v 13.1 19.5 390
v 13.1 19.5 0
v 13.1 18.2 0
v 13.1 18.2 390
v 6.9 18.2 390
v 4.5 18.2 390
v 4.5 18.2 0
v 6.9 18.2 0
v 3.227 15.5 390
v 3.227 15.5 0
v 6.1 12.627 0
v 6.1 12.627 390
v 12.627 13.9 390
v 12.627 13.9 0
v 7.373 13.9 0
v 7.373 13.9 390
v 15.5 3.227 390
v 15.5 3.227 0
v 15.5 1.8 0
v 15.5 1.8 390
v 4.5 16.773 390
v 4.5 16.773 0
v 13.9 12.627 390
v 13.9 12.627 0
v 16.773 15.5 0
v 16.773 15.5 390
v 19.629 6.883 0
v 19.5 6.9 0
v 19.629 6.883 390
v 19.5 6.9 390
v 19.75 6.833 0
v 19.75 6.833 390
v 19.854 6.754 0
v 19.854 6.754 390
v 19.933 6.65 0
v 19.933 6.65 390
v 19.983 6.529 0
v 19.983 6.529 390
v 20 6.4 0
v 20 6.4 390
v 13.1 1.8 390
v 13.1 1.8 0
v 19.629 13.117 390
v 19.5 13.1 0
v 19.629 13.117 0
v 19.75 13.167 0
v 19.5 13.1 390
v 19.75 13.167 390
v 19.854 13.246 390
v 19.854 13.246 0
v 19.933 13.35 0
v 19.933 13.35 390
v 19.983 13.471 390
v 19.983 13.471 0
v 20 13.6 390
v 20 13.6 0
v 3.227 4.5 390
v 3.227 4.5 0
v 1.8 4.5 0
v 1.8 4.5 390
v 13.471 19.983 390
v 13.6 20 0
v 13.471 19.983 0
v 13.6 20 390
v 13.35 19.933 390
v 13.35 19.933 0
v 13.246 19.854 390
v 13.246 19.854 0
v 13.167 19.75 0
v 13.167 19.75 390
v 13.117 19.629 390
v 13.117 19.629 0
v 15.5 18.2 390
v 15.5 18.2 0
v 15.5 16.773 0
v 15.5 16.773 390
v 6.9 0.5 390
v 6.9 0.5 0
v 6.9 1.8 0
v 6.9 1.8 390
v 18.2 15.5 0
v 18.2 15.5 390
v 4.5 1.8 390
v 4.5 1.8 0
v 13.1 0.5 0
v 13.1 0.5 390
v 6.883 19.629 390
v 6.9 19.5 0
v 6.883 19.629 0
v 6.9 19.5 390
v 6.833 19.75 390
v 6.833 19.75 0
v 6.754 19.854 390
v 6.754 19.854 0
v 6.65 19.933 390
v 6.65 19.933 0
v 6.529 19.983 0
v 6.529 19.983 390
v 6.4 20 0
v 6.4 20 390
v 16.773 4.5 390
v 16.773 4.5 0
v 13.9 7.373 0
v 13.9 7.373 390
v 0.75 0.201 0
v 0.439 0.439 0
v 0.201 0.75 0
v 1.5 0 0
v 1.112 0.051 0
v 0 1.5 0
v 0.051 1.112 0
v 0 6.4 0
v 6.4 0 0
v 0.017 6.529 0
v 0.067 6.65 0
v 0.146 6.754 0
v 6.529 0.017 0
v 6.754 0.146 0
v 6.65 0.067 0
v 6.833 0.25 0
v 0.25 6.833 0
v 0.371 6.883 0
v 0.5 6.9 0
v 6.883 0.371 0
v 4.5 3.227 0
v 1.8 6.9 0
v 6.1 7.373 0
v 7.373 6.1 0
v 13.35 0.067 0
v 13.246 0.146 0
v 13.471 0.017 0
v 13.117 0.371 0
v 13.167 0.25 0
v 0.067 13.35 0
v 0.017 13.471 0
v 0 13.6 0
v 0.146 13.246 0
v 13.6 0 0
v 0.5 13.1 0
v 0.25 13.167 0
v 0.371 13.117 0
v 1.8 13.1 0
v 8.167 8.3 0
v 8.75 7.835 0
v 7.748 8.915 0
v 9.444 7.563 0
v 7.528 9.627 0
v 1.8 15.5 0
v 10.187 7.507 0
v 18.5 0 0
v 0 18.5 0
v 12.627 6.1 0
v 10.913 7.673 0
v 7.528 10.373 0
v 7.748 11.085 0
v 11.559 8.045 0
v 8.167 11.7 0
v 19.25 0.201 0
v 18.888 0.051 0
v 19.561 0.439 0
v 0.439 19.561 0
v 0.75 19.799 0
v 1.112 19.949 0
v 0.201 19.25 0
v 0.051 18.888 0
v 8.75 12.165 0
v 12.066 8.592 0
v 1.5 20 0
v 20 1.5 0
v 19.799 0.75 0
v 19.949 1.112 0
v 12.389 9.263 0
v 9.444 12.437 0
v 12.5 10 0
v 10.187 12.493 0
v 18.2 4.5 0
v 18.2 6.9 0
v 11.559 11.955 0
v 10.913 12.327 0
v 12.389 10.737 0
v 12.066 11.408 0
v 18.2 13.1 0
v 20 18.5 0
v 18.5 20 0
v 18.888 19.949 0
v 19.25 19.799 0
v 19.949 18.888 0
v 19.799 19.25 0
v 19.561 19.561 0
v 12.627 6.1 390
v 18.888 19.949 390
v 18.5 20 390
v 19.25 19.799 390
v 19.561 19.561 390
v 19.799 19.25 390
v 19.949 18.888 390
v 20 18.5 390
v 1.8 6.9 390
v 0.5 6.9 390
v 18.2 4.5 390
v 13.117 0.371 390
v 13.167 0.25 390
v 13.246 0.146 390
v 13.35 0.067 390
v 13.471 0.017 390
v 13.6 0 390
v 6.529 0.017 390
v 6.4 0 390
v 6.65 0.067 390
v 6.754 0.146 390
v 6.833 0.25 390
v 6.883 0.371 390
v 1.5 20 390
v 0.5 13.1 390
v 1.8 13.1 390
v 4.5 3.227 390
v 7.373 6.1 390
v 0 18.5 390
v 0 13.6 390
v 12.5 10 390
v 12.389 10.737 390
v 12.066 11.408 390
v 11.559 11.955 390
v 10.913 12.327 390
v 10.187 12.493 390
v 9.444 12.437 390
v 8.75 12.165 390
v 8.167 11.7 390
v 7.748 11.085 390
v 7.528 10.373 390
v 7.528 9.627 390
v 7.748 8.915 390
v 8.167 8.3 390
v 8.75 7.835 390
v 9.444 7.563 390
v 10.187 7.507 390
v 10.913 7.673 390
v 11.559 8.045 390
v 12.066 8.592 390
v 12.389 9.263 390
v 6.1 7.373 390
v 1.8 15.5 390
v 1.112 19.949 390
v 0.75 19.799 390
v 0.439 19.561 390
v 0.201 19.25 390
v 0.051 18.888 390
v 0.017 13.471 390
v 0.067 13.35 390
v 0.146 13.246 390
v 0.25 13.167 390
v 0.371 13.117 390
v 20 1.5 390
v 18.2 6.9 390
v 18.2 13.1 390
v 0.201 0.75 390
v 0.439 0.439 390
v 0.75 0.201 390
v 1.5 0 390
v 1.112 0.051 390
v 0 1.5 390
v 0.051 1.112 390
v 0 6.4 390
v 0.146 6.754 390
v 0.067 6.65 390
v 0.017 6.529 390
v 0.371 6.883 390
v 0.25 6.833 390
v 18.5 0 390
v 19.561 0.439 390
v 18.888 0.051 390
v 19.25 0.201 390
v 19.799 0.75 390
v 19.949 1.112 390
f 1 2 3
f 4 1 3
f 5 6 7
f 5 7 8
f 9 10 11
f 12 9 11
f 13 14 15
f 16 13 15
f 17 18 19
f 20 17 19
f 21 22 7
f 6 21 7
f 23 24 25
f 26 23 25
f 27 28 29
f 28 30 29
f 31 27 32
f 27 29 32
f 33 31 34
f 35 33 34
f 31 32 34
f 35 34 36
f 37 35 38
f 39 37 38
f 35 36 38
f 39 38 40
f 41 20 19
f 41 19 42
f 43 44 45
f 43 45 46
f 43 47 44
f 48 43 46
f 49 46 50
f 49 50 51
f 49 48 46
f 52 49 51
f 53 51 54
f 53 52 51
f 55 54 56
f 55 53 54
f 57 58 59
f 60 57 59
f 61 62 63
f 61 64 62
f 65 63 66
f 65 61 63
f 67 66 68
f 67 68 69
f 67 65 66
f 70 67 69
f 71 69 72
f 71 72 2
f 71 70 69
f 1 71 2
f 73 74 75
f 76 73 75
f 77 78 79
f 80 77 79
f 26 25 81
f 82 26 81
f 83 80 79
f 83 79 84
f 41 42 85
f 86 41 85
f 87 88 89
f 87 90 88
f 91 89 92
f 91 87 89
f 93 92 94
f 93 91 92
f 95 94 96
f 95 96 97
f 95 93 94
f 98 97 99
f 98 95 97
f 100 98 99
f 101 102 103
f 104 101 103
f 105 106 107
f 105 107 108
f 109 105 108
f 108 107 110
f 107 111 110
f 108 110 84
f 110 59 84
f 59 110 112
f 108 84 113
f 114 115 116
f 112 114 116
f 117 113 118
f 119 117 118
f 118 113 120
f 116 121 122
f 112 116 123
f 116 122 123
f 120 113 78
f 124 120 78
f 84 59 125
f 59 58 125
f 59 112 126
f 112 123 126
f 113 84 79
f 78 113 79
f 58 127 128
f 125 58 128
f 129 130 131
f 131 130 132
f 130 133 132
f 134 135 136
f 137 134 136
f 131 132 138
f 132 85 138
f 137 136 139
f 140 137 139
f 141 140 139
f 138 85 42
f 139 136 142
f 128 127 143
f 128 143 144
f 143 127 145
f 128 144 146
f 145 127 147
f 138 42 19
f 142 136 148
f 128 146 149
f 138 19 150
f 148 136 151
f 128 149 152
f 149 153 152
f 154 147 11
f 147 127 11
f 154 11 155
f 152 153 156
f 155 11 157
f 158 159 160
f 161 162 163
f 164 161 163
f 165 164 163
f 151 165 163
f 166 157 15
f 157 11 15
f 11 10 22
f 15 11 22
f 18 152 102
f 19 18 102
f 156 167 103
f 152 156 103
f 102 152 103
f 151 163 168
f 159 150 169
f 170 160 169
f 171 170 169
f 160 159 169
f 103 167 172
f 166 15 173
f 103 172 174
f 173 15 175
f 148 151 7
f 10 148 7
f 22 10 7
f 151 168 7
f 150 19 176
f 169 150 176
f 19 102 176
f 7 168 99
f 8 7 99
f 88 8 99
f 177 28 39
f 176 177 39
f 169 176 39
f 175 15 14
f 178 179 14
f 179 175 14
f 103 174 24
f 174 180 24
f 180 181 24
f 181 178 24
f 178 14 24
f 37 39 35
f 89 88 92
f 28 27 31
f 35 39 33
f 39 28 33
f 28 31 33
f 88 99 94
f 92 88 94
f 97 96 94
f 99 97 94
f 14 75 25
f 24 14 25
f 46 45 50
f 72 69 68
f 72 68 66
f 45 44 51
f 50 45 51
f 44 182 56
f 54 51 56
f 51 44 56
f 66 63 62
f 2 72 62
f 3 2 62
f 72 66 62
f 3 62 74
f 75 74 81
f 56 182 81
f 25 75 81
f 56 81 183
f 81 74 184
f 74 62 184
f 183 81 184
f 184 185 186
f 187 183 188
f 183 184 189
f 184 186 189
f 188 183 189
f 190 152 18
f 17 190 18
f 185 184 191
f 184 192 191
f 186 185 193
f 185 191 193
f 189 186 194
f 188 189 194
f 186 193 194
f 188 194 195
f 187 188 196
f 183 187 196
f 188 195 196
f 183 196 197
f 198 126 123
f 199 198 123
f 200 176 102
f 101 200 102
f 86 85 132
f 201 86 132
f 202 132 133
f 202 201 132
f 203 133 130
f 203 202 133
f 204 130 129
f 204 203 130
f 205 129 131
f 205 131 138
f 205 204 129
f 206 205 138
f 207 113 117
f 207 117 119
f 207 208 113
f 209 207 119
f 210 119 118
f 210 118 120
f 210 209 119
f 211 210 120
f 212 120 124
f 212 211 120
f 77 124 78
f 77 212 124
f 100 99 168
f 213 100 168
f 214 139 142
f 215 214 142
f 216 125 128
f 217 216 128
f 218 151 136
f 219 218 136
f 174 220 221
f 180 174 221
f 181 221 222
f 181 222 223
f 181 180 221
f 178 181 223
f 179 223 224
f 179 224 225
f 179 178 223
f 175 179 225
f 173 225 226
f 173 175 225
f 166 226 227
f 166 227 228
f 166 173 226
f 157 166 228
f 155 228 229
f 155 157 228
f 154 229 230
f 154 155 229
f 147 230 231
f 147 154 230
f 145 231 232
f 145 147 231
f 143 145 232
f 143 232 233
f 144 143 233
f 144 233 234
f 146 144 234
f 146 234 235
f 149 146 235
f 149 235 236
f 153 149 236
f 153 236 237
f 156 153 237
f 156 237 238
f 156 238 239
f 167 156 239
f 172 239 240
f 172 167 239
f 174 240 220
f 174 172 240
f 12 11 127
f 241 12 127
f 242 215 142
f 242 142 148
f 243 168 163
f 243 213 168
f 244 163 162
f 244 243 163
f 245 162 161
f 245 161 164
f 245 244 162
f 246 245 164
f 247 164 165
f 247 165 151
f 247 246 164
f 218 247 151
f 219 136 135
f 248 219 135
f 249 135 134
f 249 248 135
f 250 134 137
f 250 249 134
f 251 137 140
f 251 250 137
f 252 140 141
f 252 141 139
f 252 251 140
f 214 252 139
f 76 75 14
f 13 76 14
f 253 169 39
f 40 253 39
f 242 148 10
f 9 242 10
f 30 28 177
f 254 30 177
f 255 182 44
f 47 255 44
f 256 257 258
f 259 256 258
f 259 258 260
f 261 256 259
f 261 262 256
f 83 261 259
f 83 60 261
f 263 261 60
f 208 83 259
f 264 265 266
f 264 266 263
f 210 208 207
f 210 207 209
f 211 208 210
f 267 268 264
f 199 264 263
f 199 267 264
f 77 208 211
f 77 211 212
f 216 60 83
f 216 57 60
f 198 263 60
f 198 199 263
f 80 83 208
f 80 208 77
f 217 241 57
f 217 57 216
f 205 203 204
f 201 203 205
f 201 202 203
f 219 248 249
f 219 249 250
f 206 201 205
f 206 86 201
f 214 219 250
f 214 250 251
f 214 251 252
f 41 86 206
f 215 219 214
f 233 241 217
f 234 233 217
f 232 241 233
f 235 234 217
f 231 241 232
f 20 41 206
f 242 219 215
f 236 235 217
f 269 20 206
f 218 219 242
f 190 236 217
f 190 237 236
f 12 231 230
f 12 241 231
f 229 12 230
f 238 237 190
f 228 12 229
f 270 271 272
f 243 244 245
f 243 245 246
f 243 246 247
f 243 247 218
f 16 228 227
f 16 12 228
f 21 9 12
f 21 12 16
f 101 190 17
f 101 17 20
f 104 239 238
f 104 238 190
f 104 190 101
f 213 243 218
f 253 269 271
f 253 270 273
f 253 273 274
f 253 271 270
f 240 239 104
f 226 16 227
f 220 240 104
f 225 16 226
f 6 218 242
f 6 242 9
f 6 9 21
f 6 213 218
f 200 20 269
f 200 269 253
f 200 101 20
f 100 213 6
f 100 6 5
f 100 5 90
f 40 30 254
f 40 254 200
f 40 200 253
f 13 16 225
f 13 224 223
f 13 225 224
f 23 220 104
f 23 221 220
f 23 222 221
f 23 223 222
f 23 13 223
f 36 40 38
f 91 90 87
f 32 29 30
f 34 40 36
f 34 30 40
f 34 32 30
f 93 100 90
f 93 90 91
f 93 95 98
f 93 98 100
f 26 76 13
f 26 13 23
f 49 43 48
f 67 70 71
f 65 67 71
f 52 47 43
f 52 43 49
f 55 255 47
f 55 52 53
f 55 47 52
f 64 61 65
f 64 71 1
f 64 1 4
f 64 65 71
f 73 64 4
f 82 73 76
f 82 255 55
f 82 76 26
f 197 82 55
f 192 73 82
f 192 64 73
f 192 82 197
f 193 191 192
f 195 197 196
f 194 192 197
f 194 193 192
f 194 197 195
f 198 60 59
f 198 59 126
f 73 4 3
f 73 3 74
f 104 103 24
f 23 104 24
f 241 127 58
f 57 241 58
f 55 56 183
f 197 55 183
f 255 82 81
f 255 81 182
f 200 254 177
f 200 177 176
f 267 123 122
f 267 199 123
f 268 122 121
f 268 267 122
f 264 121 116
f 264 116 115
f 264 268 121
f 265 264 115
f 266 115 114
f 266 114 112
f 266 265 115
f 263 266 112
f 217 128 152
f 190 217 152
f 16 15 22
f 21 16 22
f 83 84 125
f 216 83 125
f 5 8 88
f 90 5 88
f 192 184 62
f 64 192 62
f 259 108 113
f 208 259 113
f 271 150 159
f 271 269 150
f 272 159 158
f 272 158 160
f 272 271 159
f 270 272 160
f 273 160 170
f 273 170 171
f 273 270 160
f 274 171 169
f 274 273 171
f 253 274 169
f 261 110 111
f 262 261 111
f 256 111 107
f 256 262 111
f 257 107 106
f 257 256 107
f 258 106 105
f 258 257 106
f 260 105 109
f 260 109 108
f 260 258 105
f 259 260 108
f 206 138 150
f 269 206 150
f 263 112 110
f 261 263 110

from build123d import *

# Parameters (mm, degrees)
SKETCH_1_R      = 2.5
EXTRUDE_1_DEPTH = 390
FILLET_1_R      = 1.5
FILLET_2_R      = 1.5
FILLET_3_R      = 1.5
FILLET_4_R      = 1.5
FILLET_5_R      = 0.5
FILLET_6_R      = 0.5
FILLET_7_R      = 0.5
FILLET_8_R      = 0.5
FILLET_9_R      = 0.5
FILLET_10_R     = 0.5
FILLET_11_R     = 0.5
FILLET_12_R     = 0.5


with BuildPart() as part:
    # 草图1 → 凸台-拉伸1 (new body)
    with BuildSketch(Plane.XY):
        Polygon((0, 6.9), (0, 0), (6.9, 0), (6.9, 1.8), (4.5, 1.8), (4.5, 3.227207794), (7.372792206, 6.1), (12.627207794, 6.1), (15.5, 3.227207794), (15.5, 1.8), (13.1, 1.8), (13.1, 0), (20, 0), (20, 6.9), (18.2, 6.9), (18.2, 4.5), (16.772792206, 4.5), (13.9, 7.372792206), (13.9, 12.627207794), (16.772792206, 15.5), (18.2, 15.5), (18.2, 13.1), (20, 13.1), (20, 20), (13.1, 20), (13.1, 18.2), (15.5, 18.2), (15.5, 16.772792206), (12.627207794, 13.9), (7.372792206, 13.9), (4.5, 16.772792206), (4.5, 18.2), (6.9, 18.2), (6.9, 20), (0, 20), (0, 13.1), (1.8, 13.1), (1.8, 15.5), (3.227207794, 15.5), (6.1, 12.627207794), (6.1, 7.372792206), (3.227207794, 4.5), (1.8, 4.5), (1.8, 6.9), align=None)
        with Locations((10, 10)):
            Circle(SKETCH_1_R, mode=Mode.SUBTRACT)
    extrude(amount=EXTRUDE_1_DEPTH)

    # 圆角1
    fillet_1_edges = [part.edges().sort_by_distance(p)[0] for p in [
        (20, 20, 195),
    ]]
    fillet(fillet_1_edges, radius=FILLET_1_R)

    # 圆角2
    fillet_2_edges = [part.edges().sort_by_distance(p)[0] for p in [
        (0, 20, 195),
    ]]
    fillet(fillet_2_edges, radius=FILLET_2_R)

    # 圆角3
    fillet_3_edges = [part.edges().sort_by_distance(p)[0] for p in [
        (0, 0, 195),
    ]]
    fillet(fillet_3_edges, radius=FILLET_3_R)

    # 圆角4
    fillet_4_edges = [part.edges().sort_by_distance(p)[0] for p in [
        (20, 0, 195),
    ]]
    fillet(fillet_4_edges, radius=FILLET_4_R)

    # 圆角5
    fillet_5_edges = [part.edges().sort_by_distance(p)[0] for p in [
        (13.1, 20, 195),
    ]]
    fillet(fillet_5_edges, radius=FILLET_5_R)

    # 圆角6
    fillet_6_edges = [part.edges().sort_by_distance(p)[0] for p in [
        (6.9, 20, 195),
    ]]
    fillet(fillet_6_edges, radius=FILLET_6_R)

    # 圆角7
    fillet_7_edges = [part.edges().sort_by_distance(p)[0] for p in [
        (0, 13.1, 195),
    ]]
    fillet(fillet_7_edges, radius=FILLET_7_R)

    # 圆角8
    fillet_8_edges = [part.edges().sort_by_distance(p)[0] for p in [
        (0, 6.9, 195),
    ]]
    fillet(fillet_8_edges, radius=FILLET_8_R)

    # 圆角9
    fillet_9_edges = [part.edges().sort_by_distance(p)[0] for p in [
        (6.9, 0, 195),
    ]]
    fillet(fillet_9_edges, radius=FILLET_9_R)

    # 圆角10
    fillet_10_edges = [part.edges().sort_by_distance(p)[0] for p in [
        (13.1, 0, 195),
    ]]
    fillet(fillet_10_edges, radius=FILLET_10_R)

    # 圆角11
    fillet_11_edges = [part.edges().sort_by_distance(p)[0] for p in [
        (20, 13.1, 195),
    ]]
    fillet(fillet_11_edges, radius=FILLET_11_R)

    # 圆角12
    fillet_12_edges = [part.edges().sort_by_distance(p)[0] for p in [
        (20, 6.9, 195),
    ]]
    fillet(fillet_12_edges, radius=FILLET_12_R)


solid = part.part
